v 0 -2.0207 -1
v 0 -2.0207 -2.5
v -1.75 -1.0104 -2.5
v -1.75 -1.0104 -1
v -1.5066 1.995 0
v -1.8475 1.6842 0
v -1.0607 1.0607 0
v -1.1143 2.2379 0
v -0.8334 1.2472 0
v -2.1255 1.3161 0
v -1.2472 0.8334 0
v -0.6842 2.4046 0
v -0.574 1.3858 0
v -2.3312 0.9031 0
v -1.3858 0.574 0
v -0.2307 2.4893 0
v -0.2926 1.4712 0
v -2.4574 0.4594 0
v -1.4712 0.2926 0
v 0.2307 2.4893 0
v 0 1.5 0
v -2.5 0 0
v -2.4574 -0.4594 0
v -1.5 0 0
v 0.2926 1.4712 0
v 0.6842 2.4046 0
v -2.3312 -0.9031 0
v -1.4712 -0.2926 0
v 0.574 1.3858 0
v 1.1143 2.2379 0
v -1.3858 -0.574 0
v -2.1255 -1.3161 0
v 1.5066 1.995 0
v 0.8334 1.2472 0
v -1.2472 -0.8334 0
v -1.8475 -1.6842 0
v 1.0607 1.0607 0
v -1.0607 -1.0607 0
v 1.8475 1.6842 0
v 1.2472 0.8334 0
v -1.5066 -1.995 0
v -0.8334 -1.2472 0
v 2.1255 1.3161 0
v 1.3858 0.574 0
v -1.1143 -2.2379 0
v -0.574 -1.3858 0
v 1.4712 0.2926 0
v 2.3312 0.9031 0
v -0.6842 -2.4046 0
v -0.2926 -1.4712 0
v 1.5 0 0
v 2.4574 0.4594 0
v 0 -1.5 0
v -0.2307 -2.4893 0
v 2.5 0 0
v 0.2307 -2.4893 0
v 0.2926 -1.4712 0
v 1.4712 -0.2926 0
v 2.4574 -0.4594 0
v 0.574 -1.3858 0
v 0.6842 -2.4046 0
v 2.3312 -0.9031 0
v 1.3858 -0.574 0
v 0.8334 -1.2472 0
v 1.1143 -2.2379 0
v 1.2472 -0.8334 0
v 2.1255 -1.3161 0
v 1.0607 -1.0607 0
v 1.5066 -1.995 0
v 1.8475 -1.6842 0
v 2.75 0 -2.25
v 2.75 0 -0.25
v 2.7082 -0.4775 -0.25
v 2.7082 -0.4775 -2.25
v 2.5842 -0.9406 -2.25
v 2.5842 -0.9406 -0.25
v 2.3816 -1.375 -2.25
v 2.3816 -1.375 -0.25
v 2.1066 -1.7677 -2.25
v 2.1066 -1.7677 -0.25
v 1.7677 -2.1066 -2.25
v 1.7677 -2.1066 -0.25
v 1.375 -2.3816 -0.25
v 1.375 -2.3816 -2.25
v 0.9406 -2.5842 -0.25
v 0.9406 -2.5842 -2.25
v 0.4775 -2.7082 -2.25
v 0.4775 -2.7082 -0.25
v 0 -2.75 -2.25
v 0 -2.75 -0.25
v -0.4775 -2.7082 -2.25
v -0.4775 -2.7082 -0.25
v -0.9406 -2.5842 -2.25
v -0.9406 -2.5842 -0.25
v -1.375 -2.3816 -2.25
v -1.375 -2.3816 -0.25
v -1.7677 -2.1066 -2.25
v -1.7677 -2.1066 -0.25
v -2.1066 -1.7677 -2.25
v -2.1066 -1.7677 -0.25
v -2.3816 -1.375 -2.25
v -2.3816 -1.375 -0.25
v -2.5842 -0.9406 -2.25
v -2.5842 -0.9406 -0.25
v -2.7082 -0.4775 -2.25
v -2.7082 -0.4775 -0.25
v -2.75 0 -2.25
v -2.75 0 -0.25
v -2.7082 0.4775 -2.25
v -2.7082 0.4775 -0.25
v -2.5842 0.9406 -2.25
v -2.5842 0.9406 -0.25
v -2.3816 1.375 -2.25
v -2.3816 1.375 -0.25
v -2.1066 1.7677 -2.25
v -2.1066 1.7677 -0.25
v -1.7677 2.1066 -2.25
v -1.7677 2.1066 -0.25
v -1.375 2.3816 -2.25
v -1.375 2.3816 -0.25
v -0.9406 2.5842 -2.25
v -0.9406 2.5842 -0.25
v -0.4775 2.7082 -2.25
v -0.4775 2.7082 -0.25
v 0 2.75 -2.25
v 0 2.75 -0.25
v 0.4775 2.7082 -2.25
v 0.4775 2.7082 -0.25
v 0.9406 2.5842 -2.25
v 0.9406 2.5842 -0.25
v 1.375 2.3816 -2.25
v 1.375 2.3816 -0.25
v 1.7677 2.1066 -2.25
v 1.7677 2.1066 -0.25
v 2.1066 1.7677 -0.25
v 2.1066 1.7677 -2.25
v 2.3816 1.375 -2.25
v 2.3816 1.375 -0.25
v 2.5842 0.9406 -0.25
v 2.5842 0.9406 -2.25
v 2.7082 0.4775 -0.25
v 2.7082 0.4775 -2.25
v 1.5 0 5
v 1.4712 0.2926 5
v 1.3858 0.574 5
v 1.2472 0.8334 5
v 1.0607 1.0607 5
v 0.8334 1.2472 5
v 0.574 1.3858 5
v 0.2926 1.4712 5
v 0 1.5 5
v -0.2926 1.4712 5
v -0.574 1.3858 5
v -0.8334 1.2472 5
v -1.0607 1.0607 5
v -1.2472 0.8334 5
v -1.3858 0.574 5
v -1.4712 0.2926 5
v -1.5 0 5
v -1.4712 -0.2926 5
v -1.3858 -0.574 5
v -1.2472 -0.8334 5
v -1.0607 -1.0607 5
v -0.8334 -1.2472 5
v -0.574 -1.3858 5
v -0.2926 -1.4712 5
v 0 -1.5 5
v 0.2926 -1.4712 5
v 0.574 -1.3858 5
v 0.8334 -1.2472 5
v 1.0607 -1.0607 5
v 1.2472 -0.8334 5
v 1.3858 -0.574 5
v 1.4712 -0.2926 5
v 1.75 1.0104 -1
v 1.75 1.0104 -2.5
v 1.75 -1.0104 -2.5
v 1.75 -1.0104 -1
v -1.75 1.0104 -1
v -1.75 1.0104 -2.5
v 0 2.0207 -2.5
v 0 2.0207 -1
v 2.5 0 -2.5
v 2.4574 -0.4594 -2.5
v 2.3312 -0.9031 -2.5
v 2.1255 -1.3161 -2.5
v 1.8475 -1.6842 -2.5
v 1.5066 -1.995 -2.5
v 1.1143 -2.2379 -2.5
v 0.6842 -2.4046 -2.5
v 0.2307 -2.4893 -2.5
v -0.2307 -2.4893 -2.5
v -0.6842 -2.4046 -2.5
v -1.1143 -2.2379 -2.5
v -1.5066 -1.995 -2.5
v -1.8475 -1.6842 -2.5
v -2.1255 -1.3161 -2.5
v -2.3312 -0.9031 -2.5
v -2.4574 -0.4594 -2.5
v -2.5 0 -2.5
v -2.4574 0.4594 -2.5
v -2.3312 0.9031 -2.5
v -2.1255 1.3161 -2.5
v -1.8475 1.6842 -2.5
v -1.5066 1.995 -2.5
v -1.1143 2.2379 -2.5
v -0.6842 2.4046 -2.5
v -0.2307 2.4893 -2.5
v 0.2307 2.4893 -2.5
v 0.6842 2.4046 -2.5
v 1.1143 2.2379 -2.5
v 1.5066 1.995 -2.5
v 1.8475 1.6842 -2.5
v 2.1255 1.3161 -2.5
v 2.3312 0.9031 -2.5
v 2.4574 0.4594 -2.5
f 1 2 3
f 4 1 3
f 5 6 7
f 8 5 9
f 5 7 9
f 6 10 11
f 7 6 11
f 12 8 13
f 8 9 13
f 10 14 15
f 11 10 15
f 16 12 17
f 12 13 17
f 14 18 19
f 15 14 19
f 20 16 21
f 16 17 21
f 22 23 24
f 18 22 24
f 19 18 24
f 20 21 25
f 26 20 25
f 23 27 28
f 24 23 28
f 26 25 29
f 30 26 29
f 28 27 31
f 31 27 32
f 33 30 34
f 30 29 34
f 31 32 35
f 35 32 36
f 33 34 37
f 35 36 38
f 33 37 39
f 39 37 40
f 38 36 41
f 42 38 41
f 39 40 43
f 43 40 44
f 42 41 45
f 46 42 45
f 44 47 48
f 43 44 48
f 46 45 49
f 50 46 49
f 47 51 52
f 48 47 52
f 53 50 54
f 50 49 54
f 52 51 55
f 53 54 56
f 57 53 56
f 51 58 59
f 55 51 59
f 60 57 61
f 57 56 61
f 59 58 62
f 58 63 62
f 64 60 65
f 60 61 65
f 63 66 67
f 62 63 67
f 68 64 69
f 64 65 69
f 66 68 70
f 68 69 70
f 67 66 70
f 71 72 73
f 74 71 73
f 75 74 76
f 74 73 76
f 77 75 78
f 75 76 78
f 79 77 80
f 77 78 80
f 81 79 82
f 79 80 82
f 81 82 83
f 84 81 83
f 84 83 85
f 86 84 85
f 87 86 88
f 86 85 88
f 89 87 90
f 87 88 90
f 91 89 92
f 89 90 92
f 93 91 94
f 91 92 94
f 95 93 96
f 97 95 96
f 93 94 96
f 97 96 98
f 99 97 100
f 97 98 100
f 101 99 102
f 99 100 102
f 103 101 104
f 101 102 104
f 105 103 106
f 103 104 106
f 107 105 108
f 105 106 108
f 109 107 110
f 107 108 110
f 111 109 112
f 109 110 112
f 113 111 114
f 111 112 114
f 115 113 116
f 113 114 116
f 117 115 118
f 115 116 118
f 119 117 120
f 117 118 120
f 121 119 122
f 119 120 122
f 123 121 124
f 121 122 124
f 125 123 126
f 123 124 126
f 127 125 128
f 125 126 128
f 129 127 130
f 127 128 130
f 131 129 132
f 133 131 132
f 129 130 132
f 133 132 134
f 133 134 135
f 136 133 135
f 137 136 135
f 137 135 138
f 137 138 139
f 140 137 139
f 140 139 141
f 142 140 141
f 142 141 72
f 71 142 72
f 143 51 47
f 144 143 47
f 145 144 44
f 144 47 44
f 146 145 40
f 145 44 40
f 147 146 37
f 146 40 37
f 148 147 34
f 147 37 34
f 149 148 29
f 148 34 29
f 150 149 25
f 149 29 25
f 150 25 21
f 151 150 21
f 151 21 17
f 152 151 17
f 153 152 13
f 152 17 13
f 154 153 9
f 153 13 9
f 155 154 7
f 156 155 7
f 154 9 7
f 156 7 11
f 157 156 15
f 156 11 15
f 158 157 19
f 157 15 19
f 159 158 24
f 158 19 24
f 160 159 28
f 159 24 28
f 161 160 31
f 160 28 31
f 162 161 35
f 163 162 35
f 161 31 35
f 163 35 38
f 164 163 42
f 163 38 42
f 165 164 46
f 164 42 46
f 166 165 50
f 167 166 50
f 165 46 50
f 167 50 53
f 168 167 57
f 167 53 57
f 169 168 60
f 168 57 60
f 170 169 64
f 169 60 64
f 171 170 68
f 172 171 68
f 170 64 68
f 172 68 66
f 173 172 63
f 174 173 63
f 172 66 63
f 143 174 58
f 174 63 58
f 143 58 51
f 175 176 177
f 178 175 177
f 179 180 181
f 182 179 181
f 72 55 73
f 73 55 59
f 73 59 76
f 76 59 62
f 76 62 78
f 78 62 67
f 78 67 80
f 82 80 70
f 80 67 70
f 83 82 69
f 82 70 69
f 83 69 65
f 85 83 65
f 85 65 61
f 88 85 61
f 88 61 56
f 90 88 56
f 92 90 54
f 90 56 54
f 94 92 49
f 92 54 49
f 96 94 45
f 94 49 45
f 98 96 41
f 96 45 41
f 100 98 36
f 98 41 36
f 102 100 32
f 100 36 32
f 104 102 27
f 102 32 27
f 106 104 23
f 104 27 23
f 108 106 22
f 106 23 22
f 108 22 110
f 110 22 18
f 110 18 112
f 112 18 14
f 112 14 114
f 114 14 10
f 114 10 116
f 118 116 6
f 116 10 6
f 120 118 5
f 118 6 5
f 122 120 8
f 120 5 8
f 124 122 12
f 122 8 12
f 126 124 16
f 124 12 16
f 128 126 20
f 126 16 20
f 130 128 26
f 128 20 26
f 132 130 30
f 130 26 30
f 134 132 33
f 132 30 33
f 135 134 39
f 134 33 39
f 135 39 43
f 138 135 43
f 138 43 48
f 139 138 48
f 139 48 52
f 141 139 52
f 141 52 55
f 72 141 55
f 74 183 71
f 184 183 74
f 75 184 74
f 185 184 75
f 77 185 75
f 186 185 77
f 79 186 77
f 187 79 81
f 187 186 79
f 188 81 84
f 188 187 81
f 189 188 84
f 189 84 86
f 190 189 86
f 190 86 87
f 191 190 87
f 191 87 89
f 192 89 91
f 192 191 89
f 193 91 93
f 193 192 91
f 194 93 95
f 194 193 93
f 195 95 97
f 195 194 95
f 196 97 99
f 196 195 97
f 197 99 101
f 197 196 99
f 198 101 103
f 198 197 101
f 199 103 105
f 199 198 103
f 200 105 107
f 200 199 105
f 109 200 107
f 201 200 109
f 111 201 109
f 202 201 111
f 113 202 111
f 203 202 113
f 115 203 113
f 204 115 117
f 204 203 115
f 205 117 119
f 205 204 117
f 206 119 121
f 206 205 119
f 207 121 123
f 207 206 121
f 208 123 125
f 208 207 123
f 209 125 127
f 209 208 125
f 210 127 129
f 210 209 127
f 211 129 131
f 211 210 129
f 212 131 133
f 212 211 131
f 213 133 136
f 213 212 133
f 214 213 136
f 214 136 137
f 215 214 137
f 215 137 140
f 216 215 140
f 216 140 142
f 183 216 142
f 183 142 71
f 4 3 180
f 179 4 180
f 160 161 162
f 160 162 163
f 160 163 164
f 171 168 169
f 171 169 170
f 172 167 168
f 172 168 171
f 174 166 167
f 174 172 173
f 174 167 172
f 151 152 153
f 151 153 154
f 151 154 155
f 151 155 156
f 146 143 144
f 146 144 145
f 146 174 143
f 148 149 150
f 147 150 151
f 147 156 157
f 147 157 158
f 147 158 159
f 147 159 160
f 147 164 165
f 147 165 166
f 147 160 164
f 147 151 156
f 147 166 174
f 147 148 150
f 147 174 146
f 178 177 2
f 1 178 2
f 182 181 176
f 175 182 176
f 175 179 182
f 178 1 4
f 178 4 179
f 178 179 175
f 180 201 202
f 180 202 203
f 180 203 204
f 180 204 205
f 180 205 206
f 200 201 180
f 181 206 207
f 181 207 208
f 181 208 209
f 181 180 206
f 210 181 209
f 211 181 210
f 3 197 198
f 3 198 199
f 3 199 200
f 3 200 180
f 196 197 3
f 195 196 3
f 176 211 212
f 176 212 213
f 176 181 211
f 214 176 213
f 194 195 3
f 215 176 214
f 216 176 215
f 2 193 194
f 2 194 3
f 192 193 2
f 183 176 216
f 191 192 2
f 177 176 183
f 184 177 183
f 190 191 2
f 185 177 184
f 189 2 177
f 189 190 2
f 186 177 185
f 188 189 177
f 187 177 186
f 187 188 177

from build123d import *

# Parameters (mm, degrees)
F0_R     = 1.5
F1_DEPTH = 5
F2_R     = 2.75
F3_DEPTH = 2.5
F5_DEPTH = 1.5
F6_SIZE  = 0.25


with BuildPart() as f1:
    # F0 (on Top) → F1 (new body)
    with BuildSketch(Plane.XY):
        Circle(F0_R)
    extrude(amount=F1_DEPTH)

    # F2 (on face) → F3 (join)
    with BuildSketch(Plane(origin=(0, 0, 0), x_dir=(1, 0, 0), z_dir=(0, 0, -1))):
        Circle(F2_R)
    extrude(amount=F3_DEPTH)

    # F4 (on face) → F5 (cut)
    with BuildSketch(Plane(origin=(0, 0, -2.5), x_dir=(1, 0, 0), z_dir=(0, 0, -1))):
        Polygon((1.75, -1.010363), (1.75, 1.010363), (0, 2.020726), (-1.75, 1.010363), (-1.75, -1.010363), (0, -2.020726), align=None)
    extrude(amount=-F5_DEPTH, mode=Mode.SUBTRACT)

    # F6
    f6_edges = [f1.edges().sort_by_distance(p)[0] for p in [
        (-2.75, 0, 0),
        (-2.75, 0, -2.5),
    ]]
    chamfer(f6_edges, length=F6_SIZE)


solid = f1.part
